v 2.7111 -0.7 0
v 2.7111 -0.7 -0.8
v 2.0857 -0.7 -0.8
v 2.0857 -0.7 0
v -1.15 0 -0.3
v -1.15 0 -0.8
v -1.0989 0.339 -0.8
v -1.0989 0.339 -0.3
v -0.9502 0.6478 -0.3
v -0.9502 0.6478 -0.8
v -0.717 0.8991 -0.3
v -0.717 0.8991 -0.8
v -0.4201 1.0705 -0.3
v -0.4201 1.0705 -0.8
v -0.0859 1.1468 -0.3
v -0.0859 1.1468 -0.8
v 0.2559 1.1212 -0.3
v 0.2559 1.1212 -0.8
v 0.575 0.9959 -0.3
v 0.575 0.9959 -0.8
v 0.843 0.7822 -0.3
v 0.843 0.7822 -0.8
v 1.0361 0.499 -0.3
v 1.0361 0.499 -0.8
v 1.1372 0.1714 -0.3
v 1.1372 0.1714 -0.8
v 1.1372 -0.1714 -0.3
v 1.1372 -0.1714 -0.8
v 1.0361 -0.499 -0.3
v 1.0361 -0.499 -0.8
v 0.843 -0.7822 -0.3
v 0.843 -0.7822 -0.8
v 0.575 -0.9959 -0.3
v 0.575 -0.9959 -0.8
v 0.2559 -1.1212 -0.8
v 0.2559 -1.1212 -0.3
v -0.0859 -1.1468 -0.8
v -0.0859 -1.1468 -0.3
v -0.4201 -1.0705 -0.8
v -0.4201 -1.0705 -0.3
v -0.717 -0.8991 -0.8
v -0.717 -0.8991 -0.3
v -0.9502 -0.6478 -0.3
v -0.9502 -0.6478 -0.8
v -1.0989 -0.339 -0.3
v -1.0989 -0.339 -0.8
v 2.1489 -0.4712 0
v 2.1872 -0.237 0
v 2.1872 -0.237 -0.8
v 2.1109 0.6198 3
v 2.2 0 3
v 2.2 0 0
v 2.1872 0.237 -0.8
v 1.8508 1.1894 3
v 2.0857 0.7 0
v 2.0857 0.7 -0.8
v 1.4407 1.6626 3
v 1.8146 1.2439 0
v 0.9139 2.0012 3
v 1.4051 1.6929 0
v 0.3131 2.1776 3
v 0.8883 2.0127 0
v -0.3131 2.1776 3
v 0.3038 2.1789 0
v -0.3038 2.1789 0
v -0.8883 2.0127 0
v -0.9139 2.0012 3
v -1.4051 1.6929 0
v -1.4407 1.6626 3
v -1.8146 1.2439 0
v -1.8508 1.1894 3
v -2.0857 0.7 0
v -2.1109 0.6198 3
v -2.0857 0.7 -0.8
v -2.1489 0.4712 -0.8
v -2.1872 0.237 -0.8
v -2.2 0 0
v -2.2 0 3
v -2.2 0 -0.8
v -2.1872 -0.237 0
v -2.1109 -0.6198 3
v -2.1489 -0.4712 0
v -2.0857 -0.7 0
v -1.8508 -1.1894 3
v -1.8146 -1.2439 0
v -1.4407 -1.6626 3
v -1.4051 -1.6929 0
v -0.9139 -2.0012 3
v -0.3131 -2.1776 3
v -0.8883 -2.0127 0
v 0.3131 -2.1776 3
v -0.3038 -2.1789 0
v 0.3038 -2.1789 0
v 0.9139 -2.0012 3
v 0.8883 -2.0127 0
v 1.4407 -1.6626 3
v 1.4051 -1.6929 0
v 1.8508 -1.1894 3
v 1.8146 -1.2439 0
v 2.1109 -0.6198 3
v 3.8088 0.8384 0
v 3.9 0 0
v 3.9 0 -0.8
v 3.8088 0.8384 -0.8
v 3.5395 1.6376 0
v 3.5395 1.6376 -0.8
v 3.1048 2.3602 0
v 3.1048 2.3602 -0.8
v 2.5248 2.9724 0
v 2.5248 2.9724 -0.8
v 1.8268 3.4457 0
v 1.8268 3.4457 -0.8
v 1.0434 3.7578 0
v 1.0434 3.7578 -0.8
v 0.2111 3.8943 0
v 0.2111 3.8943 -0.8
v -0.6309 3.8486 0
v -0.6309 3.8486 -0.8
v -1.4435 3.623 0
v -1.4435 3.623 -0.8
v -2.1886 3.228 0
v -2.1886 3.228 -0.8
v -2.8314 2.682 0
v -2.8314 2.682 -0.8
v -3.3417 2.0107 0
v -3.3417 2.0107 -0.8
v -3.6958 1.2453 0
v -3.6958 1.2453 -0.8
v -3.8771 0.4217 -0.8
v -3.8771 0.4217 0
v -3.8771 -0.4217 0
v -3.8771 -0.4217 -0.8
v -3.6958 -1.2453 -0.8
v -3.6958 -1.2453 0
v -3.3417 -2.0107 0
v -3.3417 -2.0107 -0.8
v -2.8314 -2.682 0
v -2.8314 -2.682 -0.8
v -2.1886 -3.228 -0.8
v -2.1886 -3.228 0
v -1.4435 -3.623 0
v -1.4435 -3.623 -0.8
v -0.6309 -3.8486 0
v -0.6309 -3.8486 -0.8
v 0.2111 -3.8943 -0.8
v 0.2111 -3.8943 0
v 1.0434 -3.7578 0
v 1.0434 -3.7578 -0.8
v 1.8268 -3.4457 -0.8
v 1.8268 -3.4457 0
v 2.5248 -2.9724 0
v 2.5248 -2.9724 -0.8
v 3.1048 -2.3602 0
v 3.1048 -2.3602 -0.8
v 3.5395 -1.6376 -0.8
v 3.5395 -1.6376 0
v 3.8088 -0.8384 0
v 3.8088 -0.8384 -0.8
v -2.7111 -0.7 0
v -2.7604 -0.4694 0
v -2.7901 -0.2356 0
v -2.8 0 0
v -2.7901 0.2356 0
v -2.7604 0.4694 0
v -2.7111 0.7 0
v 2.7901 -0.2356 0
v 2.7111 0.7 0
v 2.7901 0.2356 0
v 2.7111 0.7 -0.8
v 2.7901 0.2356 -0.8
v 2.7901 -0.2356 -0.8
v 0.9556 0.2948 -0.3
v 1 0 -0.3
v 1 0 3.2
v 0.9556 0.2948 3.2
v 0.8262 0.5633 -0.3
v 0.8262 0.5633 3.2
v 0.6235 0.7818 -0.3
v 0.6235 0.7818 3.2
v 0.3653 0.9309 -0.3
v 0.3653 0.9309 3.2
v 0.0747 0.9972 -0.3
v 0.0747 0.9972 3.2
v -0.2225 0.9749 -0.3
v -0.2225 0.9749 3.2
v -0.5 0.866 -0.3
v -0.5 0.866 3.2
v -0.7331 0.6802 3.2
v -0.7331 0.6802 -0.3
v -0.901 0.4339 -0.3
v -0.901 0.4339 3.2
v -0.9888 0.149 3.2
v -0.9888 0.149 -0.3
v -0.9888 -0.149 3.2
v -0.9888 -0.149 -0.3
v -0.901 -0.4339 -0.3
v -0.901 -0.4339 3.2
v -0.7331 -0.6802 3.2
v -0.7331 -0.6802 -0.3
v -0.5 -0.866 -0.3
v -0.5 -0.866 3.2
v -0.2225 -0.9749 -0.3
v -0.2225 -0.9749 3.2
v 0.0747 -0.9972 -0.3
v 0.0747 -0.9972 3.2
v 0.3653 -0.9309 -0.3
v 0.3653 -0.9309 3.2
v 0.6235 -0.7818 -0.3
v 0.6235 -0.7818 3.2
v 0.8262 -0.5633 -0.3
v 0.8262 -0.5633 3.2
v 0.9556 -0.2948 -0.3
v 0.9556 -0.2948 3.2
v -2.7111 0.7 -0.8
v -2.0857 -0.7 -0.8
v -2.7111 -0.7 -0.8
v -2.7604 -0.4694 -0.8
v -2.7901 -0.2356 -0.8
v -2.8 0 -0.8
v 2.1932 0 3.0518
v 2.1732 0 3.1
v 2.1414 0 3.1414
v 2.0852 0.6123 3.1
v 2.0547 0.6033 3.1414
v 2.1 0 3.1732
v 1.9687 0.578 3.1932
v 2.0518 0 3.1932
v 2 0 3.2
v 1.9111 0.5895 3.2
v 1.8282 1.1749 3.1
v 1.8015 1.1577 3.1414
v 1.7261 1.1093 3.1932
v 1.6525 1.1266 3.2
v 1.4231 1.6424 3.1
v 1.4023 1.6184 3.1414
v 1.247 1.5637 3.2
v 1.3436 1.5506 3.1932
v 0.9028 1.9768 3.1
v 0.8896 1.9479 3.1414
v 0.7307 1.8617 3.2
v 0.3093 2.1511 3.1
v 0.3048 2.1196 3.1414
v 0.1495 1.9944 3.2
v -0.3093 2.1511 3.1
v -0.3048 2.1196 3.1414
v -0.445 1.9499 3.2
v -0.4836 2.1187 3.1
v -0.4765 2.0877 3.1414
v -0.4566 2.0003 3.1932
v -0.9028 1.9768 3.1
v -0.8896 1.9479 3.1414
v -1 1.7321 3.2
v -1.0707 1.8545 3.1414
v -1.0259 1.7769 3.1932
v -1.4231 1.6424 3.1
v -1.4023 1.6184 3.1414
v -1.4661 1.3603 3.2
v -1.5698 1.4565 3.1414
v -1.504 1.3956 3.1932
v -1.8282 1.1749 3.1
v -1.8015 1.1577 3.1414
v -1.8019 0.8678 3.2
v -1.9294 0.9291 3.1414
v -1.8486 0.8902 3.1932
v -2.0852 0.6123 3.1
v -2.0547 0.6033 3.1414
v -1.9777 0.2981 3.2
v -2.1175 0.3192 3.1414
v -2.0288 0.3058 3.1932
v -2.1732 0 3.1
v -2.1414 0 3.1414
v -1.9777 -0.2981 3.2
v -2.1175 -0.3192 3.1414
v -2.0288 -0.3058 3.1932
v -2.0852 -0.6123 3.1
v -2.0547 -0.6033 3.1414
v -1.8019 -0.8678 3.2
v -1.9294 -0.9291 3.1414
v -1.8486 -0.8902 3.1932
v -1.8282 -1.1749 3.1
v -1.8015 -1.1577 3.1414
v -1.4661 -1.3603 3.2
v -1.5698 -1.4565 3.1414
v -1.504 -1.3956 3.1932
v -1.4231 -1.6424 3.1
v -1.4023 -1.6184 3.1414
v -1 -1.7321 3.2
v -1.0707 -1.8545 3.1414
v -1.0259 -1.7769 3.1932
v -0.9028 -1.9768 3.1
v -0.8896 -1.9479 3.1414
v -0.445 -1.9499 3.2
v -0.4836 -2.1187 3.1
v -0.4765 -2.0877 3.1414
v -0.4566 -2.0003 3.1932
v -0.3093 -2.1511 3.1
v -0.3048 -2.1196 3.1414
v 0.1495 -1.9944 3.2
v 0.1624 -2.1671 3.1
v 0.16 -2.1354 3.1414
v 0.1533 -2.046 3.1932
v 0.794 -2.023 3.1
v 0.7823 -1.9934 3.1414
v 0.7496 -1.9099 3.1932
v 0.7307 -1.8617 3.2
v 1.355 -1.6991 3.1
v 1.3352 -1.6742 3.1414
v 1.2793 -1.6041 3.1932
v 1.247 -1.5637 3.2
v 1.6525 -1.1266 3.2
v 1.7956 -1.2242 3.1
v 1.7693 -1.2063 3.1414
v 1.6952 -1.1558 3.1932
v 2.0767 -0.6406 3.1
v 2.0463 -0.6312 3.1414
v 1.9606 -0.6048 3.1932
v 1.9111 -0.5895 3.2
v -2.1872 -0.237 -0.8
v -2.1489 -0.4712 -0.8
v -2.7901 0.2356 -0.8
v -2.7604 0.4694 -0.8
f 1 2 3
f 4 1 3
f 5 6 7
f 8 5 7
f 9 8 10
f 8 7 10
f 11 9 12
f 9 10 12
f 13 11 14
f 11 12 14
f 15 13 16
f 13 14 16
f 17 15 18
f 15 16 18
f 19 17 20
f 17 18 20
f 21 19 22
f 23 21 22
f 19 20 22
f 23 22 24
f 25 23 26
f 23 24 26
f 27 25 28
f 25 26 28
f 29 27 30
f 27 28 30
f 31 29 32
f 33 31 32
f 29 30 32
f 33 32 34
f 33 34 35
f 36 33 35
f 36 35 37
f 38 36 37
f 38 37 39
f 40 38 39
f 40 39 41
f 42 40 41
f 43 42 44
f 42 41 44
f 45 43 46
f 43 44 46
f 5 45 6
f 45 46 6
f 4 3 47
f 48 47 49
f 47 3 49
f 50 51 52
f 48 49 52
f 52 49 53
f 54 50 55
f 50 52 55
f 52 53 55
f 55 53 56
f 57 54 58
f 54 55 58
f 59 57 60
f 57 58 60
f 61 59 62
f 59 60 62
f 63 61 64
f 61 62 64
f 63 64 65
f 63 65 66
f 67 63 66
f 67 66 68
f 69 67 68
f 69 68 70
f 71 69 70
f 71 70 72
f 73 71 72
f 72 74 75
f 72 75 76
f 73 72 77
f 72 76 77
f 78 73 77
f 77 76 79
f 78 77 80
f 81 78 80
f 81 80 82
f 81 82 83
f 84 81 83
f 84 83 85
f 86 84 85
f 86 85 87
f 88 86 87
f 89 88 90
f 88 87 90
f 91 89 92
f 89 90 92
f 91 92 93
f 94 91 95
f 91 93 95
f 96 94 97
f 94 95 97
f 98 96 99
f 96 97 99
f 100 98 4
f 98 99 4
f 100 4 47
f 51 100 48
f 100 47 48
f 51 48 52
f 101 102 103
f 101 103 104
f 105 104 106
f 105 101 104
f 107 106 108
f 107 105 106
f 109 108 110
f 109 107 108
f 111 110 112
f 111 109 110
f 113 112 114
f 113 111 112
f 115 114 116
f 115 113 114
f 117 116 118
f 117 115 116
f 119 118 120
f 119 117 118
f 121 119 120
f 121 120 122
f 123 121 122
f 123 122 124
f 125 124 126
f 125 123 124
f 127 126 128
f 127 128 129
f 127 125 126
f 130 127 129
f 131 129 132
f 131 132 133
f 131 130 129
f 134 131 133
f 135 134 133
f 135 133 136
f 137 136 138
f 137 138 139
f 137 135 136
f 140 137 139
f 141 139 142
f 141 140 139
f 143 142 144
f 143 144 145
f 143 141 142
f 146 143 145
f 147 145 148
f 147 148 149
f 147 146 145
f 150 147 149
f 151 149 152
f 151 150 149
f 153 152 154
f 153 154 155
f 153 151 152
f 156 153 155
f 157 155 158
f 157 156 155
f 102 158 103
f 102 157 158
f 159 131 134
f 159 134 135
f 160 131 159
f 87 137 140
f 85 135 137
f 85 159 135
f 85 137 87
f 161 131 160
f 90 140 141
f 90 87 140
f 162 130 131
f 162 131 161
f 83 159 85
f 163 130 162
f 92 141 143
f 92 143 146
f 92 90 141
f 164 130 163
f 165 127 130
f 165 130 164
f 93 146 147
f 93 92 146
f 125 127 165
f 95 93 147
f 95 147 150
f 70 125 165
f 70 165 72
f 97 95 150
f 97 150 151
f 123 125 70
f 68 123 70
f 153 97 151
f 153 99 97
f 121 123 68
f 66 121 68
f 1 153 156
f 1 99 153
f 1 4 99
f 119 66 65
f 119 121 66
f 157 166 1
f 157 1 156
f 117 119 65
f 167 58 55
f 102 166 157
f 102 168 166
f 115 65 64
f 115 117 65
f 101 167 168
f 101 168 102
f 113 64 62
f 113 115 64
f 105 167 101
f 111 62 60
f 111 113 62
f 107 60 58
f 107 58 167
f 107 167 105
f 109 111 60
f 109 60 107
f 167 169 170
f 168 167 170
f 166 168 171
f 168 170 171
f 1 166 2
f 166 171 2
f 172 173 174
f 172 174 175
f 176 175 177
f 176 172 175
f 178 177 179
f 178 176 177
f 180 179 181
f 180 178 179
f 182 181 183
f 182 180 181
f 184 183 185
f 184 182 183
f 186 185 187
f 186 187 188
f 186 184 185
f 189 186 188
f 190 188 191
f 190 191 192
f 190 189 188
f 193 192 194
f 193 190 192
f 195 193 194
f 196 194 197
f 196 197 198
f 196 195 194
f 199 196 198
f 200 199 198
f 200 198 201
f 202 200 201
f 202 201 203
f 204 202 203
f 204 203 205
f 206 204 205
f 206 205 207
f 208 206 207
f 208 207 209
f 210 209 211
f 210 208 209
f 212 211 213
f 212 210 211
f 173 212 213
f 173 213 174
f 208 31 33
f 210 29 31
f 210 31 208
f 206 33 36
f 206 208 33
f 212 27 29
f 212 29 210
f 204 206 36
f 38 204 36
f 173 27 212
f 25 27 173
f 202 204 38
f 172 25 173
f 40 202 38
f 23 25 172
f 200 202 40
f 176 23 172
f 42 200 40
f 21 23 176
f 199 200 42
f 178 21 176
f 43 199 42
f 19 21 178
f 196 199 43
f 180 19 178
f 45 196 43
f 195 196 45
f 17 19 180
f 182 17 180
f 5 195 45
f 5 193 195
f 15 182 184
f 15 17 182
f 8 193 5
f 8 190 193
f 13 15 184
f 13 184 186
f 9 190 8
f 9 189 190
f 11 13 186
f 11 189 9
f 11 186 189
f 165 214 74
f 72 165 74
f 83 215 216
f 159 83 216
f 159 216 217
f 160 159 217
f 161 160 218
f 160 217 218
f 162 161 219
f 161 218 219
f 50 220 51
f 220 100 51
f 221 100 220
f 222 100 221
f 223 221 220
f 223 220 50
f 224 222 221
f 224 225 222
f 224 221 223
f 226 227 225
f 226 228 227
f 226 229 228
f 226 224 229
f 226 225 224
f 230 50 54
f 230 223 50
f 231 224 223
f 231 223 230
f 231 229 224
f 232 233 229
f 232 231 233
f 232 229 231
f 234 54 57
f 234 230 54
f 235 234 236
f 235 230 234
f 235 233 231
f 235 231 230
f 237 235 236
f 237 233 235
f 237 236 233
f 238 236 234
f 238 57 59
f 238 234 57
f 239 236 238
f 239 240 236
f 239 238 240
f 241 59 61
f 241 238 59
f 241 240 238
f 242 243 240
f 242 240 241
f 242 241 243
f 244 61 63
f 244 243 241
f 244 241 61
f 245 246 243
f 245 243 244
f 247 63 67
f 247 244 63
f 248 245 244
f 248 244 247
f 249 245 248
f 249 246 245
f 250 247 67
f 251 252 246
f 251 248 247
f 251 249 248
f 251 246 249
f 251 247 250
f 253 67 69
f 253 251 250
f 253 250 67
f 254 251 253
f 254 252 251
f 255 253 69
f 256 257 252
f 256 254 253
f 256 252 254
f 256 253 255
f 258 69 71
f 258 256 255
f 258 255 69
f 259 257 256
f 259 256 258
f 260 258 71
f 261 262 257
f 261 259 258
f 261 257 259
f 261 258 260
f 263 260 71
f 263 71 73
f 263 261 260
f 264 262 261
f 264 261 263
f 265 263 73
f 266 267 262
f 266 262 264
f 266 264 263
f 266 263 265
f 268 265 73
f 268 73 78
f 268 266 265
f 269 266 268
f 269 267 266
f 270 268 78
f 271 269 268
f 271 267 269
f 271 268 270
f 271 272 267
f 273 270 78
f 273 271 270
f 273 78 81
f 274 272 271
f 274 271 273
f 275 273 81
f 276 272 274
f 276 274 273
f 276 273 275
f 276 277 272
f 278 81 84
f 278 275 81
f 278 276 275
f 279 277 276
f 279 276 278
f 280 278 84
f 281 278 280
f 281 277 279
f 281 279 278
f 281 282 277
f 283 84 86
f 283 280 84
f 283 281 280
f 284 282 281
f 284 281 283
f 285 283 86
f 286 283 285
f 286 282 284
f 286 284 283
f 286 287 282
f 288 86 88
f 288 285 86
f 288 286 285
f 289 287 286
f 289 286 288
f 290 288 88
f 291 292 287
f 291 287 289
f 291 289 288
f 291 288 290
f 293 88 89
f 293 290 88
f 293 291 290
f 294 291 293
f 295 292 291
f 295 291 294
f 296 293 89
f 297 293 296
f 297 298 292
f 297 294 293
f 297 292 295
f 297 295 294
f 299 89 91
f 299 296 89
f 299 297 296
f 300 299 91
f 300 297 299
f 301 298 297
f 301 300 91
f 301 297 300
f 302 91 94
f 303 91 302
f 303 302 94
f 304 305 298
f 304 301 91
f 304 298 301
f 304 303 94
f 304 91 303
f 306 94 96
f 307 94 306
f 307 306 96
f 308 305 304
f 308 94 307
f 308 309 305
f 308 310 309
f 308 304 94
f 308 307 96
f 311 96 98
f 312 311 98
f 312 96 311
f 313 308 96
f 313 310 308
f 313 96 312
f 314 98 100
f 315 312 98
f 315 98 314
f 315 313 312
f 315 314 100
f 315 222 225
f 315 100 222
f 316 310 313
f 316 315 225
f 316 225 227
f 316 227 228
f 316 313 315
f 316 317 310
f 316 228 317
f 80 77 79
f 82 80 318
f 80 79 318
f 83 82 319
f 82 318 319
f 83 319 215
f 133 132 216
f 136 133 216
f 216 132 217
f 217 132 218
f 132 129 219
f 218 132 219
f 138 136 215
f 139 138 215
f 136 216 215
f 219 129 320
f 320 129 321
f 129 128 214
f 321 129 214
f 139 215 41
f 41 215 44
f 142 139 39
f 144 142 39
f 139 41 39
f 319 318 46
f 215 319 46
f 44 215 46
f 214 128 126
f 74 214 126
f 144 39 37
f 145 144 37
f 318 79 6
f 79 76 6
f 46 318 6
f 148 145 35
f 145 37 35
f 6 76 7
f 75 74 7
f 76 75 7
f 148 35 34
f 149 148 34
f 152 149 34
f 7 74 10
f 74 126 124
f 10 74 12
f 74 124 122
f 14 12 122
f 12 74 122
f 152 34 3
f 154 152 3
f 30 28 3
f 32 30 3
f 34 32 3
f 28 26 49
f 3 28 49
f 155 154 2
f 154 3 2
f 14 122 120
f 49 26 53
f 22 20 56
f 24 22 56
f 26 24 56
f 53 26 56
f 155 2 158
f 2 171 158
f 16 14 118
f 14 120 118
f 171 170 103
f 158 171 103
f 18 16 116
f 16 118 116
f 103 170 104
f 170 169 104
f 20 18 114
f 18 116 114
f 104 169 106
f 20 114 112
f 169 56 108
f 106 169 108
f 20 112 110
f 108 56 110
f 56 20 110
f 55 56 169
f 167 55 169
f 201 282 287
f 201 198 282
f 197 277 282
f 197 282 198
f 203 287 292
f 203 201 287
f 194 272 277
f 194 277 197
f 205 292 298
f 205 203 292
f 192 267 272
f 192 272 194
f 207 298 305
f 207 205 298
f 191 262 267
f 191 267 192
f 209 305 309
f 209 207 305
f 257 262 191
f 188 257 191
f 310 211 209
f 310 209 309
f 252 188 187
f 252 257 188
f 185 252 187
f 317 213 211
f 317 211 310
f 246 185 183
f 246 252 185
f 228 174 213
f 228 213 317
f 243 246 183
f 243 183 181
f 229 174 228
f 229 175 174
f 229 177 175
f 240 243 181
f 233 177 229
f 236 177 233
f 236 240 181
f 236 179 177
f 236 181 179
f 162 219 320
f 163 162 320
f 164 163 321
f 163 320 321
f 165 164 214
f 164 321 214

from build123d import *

# Parameters (mm, degrees)
SKETCH_1_R          = 3.9
SKETCH_1_R_2        = 2.2
SKETCH_1_R_3        = 1
EXTRUDE_1_DEPTH     = 0.8
SKETCH_1_4_R        = 2.2
SKETCH_1_4_R_2      = 1
EXTRUDE_2_DEPTH     = 3.2
FILLET_1_R          = 0.2
SKETCH_2_R          = 1.15
CUT_EXTRUDE_1_DEPTH = 0.5
CUT_EXTRUDE_2_REACH = 8.813


with BuildPart() as part:
    # Sketch 1 → Extrude 1 (new body)
    with BuildSketch(Plane.XY):
        Circle(SKETCH_1_R)
        Circle(SKETCH_1_R_2, mode=Mode.SUBTRACT)
        Circle(SKETCH_1_R_2)
        Circle(SKETCH_1_R_3, mode=Mode.SUBTRACT)
    extrude(amount=-EXTRUDE_1_DEPTH)

    # Sketch 1_4 → Extrude 2 (add)
    with BuildSketch(Plane.XY):
        Circle(SKETCH_1_4_R)
        Circle(SKETCH_1_4_R_2, mode=Mode.SUBTRACT)
    extrude(amount=EXTRUDE_2_DEPTH)

    # Fillet 1
    fillet_1_edges = [part.edges().sort_by_distance(p)[0] for p in [
        (-2.2, 0, 3.2),
    ]]
    fillet(fillet_1_edges, radius=FILLET_1_R)

    # Sketch 2 → Cut-Extrude 1 (cut)
    with BuildSketch(Plane(origin=(0, 0, -0.8), x_dir=(-1, 0, 0), z_dir=(0, 0, -1))):
        Circle(SKETCH_2_R)
    extrude(amount=-CUT_EXTRUDE_1_DEPTH, mode=Mode.SUBTRACT)

    # Sketch 3 → Cut-Extrude 2 (cut, up to next)
    with BuildSketch(Plane(origin=(0, 0, -0.8), x_dir=(-1, 0, 0), z_dir=(0, 0, -1)), mode=Mode.PRIVATE) as cut_extrude_2_sk1:
        with BuildLine():
            ThreePointArc((-2.711088342, 0.7), (-2.8, 0), (-2.711088342, -0.7))
            Line((-2.711088342, -0.7), (-2.085665361, -0.7))
            ThreePointArc((-2.085665361, -0.7), (-2.2, 0), (-2.085665361, 0.7))
            Line((-2.085665361, 0.7), (-2.711088342, 0.7))
        make_face()
    cut_extrude_2_tool1 = extrude(cut_extrude_2_sk1.sketch, amount=-CUT_EXTRUDE_2_REACH, mode=Mode.PRIVATE) & part.part
    # Sketch 3 → Cut-Extrude 2 (cut, up to next)
    with BuildSketch(Plane(origin=(0, 0, -0.8), x_dir=(-1, 0, 0), z_dir=(0, 0, -1)), mode=Mode.PRIVATE) as cut_extrude_2_sk2:
        with BuildLine():
            Line((2.085665361, -0.7), (2.711088342, -0.7))
            ThreePointArc((2.711088342, -0.7), (2.77768315, -0.352812019), (2.8, 0))
            ThreePointArc((2.8, 0), (2.77768315, 0.352812019), (2.711088342, 0.7))
            Line((2.711088342, 0.7), (2.085665361, 0.7))
            ThreePointArc((2.085665361, 0.7), (2.1712282, 0.354637988), (2.2, 0))
            ThreePointArc((2.2, 0), (2.1712282, -0.354637988), (2.085665361, -0.7))
        make_face()
    cut_extrude_2_tool2 = extrude(cut_extrude_2_sk2.sketch, amount=-CUT_EXTRUDE_2_REACH, mode=Mode.PRIVATE) & part.part
    # Sketch 3 → Cut-Extrude 2 (cut, up to next)
    with BuildSketch(Plane(origin=(0, 0, -0.8), x_dir=(-1, 0, 0), z_dir=(0, 0, -1)), mode=Mode.PRIVATE) as cut_extrude_2_sk3:
        with BuildLine():
            ThreePointArc((-2.711088342, 0.7), (-2.8, 0), (-2.711088342, -0.7))
            Line((-2.711088342, -0.7), (-2.085665361, -0.7))
            ThreePointArc((-2.085665361, -0.7), (-2.2, 0), (-2.085665361, 0.7))
            Line((-2.085665361, 0.7), (-2.711088342, 0.7))
        make_face()
    cut_extrude_2_tool3 = extrude(cut_extrude_2_sk3.sketch, amount=-CUT_EXTRUDE_2_REACH, mode=Mode.PRIVATE) & part.part
    # Sketch 3 → Cut-Extrude 2 (cut, up to next)
    with BuildSketch(Plane(origin=(0, 0, -0.8), x_dir=(-1, 0, 0), z_dir=(0, 0, -1)), mode=Mode.PRIVATE) as cut_extrude_2_sk4:
        with BuildLine():
            Line((2.085665361, -0.7), (2.711088342, -0.7))
            ThreePointArc((2.711088342, -0.7), (2.77768315, -0.352812019), (2.8, 0))
            ThreePointArc((2.8, 0), (2.77768315, 0.352812019), (2.711088342, 0.7))
            Line((2.711088342, 0.7), (2.085665361, 0.7))
            ThreePointArc((2.085665361, 0.7), (2.1712282, 0.354637988), (2.2, 0))
            ThreePointArc((2.2, 0), (2.1712282, -0.354637988), (2.085665361, -0.7))
        make_face()
    cut_extrude_2_tool4 = extrude(cut_extrude_2_sk4.sketch, amount=-CUT_EXTRUDE_2_REACH, mode=Mode.PRIVATE) & part.part
    add(cut_extrude_2_tool1.solids().sort_by_distance((2.466051, 0, -0.8))[0], mode=Mode.SUBTRACT)
    add(cut_extrude_2_tool2.solids().sort_by_distance((-2.466051, 0, -0.8))[0], mode=Mode.SUBTRACT)
    add(cut_extrude_2_tool3.solids().sort_by_distance((2.466051, 0, -0.8))[0], mode=Mode.SUBTRACT)
    add(cut_extrude_2_tool4.solids().sort_by_distance((-2.466051, 0, -0.8))[0], mode=Mode.SUBTRACT)


solid = part.part
